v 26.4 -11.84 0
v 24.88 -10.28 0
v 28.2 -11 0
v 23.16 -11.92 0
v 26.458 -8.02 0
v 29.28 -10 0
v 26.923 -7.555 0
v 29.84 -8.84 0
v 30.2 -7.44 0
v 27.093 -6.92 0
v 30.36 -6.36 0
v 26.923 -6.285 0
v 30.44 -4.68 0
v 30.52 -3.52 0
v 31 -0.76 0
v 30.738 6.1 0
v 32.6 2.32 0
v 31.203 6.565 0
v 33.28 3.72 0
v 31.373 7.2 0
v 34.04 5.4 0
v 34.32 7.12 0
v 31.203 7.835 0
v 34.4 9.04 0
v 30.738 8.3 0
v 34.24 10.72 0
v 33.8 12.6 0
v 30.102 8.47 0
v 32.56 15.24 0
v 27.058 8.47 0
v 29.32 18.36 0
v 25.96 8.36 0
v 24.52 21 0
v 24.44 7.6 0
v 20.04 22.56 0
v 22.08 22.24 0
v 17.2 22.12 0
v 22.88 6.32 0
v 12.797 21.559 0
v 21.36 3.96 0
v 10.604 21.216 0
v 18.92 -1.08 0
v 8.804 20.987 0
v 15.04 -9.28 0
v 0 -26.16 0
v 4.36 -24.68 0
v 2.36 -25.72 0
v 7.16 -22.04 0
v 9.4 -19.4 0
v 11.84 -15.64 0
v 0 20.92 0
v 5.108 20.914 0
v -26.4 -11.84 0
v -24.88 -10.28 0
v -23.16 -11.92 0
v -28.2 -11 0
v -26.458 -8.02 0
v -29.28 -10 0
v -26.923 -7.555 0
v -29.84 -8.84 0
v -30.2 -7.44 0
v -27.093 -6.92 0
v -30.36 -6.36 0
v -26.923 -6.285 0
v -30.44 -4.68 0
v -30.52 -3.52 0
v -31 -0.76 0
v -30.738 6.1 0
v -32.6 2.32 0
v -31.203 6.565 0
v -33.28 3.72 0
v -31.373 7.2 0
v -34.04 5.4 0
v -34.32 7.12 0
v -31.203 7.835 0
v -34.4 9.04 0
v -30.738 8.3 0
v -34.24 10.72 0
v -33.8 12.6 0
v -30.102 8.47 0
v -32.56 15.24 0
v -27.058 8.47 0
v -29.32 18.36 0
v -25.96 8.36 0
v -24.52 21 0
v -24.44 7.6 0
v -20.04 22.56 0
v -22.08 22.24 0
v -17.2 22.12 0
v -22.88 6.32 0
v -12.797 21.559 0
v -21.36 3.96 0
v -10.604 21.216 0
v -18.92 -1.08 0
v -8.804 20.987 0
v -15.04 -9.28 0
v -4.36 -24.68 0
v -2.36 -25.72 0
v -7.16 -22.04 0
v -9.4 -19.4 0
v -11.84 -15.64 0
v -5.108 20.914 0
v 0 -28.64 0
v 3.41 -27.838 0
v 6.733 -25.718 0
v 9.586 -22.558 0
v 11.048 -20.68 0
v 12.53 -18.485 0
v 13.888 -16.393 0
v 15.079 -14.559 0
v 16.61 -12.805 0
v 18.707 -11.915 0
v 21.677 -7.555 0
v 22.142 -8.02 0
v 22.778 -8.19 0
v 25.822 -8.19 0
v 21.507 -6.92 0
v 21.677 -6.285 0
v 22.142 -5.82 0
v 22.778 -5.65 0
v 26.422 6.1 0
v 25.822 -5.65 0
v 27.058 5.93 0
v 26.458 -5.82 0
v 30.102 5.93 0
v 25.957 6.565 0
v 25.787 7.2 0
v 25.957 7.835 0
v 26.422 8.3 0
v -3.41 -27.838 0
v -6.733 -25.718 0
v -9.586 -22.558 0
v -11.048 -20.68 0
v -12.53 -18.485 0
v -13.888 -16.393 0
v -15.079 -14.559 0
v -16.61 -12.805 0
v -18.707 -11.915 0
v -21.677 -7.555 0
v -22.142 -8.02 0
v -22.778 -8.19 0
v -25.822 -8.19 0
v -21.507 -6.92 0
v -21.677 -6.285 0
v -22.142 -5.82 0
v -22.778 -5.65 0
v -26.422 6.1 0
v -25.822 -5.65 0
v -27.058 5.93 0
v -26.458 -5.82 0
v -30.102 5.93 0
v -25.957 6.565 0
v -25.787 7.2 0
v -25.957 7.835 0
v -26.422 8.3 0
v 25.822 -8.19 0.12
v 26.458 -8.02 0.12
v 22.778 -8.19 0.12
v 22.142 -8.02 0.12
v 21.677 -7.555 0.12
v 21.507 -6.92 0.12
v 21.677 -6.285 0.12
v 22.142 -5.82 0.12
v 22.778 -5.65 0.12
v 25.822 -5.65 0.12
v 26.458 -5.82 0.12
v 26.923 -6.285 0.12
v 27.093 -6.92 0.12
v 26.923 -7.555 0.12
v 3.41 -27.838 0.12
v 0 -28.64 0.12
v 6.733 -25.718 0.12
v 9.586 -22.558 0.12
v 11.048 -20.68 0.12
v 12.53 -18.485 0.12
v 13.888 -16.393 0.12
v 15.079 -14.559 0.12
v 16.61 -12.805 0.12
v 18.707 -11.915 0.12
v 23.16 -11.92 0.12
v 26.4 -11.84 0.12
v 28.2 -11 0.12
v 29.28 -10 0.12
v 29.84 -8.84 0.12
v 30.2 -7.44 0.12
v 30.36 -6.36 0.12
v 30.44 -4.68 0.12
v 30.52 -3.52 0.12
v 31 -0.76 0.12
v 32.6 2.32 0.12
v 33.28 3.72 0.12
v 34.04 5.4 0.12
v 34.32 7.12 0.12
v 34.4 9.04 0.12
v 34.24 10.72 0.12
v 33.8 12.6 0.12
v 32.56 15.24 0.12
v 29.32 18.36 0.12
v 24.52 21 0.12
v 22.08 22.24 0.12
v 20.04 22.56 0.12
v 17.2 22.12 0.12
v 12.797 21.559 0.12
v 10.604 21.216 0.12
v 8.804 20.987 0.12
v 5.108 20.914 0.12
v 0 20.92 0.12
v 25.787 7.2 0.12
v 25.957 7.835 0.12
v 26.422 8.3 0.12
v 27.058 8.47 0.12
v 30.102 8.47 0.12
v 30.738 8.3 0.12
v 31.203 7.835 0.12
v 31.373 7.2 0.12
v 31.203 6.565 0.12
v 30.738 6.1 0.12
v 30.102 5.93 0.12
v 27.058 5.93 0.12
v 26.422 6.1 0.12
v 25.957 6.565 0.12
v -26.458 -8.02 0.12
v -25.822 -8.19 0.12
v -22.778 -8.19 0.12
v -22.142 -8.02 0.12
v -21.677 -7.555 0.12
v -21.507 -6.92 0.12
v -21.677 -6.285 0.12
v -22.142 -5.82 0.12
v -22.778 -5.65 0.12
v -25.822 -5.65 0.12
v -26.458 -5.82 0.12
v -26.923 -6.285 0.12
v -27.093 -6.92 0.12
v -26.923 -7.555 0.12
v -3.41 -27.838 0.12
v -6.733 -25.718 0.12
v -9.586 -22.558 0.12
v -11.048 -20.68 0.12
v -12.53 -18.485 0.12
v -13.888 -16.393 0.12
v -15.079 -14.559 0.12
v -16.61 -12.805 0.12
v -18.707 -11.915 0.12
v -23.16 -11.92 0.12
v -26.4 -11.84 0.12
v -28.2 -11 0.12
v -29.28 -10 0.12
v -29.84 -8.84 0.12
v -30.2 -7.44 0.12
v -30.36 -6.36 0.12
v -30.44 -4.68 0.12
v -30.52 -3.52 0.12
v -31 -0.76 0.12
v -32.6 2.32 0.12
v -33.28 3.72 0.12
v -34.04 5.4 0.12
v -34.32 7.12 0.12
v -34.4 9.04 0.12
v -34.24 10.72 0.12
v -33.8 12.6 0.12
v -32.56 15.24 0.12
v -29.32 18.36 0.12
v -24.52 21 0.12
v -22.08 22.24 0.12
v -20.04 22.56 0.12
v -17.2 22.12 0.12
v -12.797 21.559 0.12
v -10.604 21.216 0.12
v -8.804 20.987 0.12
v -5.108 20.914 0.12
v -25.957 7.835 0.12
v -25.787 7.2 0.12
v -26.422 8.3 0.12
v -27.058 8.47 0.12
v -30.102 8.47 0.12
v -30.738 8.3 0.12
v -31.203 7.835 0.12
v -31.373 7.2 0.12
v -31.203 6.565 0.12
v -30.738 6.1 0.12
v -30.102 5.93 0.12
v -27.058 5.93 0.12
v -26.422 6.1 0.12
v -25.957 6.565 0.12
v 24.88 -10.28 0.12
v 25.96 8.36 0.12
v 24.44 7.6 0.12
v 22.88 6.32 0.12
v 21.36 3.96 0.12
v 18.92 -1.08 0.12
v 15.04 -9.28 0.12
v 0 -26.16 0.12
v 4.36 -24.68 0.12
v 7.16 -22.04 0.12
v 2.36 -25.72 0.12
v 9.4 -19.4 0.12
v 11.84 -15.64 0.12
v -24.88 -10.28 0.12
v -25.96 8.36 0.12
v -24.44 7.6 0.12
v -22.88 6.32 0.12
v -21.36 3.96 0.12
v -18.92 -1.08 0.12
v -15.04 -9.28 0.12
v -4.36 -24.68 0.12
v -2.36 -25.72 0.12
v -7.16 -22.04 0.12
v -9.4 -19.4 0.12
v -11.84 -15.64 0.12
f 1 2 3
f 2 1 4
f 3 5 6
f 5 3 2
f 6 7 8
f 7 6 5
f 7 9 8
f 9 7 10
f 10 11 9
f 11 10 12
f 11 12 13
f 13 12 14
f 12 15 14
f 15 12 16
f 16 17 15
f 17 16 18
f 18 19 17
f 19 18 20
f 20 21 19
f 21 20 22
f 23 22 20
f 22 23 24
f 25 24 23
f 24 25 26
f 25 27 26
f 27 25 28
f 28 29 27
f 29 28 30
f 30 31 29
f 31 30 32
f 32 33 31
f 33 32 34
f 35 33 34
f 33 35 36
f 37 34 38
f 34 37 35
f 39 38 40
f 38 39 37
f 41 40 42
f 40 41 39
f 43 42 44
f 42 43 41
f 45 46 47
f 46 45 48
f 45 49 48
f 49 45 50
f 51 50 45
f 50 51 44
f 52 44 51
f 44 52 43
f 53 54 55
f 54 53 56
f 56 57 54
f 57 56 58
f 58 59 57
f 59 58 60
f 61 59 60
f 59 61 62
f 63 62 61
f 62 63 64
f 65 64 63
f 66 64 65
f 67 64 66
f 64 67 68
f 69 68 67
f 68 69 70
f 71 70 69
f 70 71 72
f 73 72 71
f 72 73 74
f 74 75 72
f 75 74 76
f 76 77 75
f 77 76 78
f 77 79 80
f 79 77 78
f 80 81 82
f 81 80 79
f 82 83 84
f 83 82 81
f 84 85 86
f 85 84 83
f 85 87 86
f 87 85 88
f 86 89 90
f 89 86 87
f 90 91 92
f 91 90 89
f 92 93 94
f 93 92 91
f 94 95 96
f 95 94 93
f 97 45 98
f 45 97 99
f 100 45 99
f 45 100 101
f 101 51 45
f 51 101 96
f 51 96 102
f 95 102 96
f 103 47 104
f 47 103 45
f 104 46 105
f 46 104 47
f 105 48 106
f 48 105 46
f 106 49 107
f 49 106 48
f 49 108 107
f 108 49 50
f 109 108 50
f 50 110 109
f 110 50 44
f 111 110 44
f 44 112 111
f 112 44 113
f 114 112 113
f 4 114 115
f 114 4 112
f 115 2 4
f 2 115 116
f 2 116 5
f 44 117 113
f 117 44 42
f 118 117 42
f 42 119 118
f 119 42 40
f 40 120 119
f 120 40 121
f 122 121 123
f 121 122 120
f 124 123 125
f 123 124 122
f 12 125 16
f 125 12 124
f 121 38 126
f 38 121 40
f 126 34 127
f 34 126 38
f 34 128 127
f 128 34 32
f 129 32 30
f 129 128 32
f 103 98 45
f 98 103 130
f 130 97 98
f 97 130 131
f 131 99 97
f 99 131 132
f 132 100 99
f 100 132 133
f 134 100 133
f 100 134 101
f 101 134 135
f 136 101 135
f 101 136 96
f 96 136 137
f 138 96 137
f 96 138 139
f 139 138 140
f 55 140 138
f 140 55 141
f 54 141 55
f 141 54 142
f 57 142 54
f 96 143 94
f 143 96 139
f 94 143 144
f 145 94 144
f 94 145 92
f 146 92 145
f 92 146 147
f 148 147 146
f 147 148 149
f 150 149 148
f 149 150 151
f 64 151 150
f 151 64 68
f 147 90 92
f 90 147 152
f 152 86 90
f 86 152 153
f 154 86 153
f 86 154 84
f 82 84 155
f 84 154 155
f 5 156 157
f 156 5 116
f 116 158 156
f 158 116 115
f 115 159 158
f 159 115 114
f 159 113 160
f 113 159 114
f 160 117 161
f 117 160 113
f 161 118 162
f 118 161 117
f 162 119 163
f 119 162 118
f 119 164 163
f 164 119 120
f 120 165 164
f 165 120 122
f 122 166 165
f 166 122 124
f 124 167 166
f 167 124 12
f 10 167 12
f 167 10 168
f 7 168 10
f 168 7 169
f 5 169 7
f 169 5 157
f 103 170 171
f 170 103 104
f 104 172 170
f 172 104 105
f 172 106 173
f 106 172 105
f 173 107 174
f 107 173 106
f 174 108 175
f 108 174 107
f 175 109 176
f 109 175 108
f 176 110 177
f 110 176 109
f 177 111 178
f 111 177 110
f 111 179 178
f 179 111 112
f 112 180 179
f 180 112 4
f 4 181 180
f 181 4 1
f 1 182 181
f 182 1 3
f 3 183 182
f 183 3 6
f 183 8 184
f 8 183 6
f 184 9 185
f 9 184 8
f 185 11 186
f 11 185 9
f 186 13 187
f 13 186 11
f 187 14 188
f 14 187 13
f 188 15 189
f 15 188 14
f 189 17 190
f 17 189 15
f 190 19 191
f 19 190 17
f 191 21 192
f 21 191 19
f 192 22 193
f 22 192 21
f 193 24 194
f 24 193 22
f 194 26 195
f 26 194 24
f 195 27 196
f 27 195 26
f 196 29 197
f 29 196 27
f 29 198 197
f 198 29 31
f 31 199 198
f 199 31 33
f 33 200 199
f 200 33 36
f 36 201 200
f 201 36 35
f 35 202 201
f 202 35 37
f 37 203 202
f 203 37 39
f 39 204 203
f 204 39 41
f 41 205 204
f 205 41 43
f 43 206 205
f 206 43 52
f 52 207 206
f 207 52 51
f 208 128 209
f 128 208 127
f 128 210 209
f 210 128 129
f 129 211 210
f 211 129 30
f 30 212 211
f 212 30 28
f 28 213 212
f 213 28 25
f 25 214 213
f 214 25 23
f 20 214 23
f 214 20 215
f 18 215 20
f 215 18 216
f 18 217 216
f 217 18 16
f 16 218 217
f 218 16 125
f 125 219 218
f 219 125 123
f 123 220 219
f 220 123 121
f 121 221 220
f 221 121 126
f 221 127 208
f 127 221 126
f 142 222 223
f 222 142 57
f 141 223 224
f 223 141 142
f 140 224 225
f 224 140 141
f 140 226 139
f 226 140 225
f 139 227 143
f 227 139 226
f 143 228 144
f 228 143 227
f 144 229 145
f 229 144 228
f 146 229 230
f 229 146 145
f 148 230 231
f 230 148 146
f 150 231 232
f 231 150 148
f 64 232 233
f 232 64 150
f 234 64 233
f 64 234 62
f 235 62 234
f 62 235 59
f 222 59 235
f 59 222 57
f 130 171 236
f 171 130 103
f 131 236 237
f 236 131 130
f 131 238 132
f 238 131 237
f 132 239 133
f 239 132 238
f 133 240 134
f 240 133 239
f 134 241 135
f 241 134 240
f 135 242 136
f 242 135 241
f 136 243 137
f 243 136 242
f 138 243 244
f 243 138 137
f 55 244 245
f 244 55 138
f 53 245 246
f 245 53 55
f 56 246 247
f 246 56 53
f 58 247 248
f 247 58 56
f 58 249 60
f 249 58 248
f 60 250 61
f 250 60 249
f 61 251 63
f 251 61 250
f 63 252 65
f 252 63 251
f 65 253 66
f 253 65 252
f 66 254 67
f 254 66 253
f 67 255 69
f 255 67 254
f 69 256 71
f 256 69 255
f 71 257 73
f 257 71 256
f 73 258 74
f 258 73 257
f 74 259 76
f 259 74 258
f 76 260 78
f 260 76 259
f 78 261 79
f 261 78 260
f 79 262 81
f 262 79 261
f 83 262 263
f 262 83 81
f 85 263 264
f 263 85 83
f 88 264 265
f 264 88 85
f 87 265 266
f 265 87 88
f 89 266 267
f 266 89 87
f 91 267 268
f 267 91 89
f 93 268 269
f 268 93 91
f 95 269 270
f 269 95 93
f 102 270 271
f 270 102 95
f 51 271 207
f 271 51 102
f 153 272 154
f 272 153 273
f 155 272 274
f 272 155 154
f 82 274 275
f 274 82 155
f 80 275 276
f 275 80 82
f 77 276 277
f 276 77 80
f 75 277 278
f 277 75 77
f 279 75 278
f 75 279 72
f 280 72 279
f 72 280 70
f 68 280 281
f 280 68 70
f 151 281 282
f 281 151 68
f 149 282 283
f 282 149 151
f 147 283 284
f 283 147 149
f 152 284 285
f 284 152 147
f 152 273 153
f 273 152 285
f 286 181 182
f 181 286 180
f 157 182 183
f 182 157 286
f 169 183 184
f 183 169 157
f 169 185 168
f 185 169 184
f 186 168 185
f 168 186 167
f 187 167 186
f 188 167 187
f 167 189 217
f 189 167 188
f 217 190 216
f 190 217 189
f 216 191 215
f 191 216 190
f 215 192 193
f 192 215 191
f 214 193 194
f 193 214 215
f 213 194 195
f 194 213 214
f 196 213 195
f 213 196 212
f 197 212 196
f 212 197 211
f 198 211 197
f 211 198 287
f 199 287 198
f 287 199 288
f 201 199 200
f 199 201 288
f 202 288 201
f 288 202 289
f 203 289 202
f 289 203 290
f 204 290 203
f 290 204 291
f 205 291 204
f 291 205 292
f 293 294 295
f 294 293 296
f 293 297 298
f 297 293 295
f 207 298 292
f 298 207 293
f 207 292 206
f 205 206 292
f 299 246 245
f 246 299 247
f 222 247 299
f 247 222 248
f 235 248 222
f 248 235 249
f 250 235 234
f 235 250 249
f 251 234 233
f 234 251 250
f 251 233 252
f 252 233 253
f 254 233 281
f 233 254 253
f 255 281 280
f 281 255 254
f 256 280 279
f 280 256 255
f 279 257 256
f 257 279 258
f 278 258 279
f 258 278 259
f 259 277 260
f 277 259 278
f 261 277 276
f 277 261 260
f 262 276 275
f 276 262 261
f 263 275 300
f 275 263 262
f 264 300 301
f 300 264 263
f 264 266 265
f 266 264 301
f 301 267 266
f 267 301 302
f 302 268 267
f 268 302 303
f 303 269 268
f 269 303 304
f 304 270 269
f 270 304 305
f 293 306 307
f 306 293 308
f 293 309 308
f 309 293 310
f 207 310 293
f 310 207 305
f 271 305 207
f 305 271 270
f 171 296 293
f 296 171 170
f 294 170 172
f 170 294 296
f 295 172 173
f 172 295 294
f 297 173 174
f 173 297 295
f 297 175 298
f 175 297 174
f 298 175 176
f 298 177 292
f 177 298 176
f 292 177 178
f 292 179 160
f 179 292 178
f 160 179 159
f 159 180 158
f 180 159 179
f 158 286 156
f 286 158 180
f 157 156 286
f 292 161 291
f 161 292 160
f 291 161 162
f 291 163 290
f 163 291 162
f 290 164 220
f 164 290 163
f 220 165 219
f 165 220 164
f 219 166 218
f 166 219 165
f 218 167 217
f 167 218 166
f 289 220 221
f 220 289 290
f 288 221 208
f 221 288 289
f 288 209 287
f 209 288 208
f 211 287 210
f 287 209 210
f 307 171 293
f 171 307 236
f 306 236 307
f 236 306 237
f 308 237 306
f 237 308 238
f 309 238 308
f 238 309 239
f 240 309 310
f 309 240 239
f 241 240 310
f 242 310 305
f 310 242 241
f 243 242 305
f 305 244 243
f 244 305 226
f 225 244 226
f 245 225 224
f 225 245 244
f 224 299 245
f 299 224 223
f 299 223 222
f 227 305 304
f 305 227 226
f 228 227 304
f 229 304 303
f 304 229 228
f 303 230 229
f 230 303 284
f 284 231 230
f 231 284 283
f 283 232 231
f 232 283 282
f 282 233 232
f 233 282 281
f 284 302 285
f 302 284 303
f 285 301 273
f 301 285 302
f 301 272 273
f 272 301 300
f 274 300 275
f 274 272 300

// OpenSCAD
// file: s/67144s02.scad
use <../../lib.scad>
function ldraw_lib__s__67144s02() = [
// 0 ~Sheet Plastic  8.5 x  7 Motorcycle Windscreen Border
// 0 Name: s\67144s02.dat
// 0 Author: Philippe Hurbain [Philo]
// 0 !LDRAW_ORG Subpart UPDATE 2023-05
// 0 !LICENSE Licensed under CC BY 4.0 : see CAreadme.txt
// 
// 0 BFC CERTIFY CCW
  [0,"BFC","CERTIFY"],
  [0,"BFC","CCW"],
// 
// 0 !HISTORY 2023-10-31 [OrionP] Official Update 2023-05
// 
// 
// 4 16 0 0 -65.4 0 0 -71.6 8.52439 0 -69.59618 5.9 0 -64.3
  [4,16,0,0,-65.4,0,0,-71.6,8.52439,0,-69.59618,5.9,0,-64.3],
// 4 16 10.9 0 -61.7 5.9 0 -64.3 8.52439 0 -69.59618 16.83324 0 -64.29516
  [4,16,10.9,0,-61.7,5.9,0,-64.3,8.52439,0,-69.59618,16.83324,0,-64.29516],
// 4 16 17.9 0 -55.1 10.9 0 -61.7 16.83324 0 -64.29516 23.96543 0 -56.39425
  [4,16,17.9,0,-55.1,10.9,0,-61.7,16.83324,0,-64.29516,23.96543,0,-56.39425],
// 4 16 23.5 0 -48.5 17.9 0 -55.1 23.96543 0 -56.39425 27.62011 0 -51.6993
  [4,16,23.5,0,-48.5,17.9,0,-55.1,23.96543,0,-56.39425,27.62011,0,-51.6993],
// 4 16 23.5 0 -48.5 27.62011 0 -51.6993 31.32512 0 -46.21306 29.6 0 -39.1
  [4,16,23.5,0,-48.5,27.62011,0,-51.6993,31.32512,0,-46.21306,29.6,0,-39.1],
// 3 16 29.6 0 -39.1 31.32512 0 -46.21306 34.71881 0 -40.98355
  [3,16,29.6,0,-39.1,31.32512,0,-46.21306,34.71881,0,-40.98355],
// 4 16 29.6 0 -39.1 34.71881 0 -40.98355 37.698 0 -36.39858 37.6 0 -23.2
  [4,16,29.6,0,-39.1,34.71881,0,-40.98355,37.698,0,-36.39858,37.6,0,-23.2],
// 3 16 37.6 0 -23.2 37.698 0 -36.39858 41.52391 0 -32.01343
  [3,16,37.6,0,-23.2,37.698,0,-36.39858,41.52391,0,-32.01343],
// 4 16 37.6 0 -23.2 41.52391 0 -32.01343 46.76639 0 -29.78813 54.19371 0 -18.88783
  [4,16,37.6,0,-23.2,41.52391,0,-32.01343,46.76639,0,-29.78813,54.19371,0,-18.88783],
// 3 16 54.19371 0 -18.88783 46.76639 0 -29.78813 55.35609 0 -20.05021
  [3,16,54.19371,0,-18.88783,46.76639,0,-29.78813,55.35609,0,-20.05021],
// 4 16 56.94392 0 -20.47566 55.35609 0 -20.05021 46.76639 0 -29.78813 57.9 0 -29.8
  [4,16,56.94392,0,-20.47566,55.35609,0,-20.05021,46.76639,0,-29.78813,57.9,0,-29.8],
// 4 16 56.94392 0 -20.47566 57.9 0 -29.8 62.2 0 -25.7 64.55608 0 -20.47566
  [4,16,56.94392,0,-20.47566,57.9,0,-29.8,62.2,0,-25.7,64.55608,0,-20.47566],
// 3 16 66.14391 0 -20.05021 64.55608 0 -20.47566 62.2 0 -25.7
  [3,16,66.14391,0,-20.05021,64.55608,0,-20.47566,62.2,0,-25.7],
// 4 16 37.6 0 -23.2 54.19371 0 -18.88783 53.76825 0 -17.3 47.3 0 -2.7
  [4,16,37.6,0,-23.2,54.19371,0,-18.88783,53.76825,0,-17.3,47.3,0,-2.7],
// 3 16 47.3 0 -2.7 53.76825 0 -17.3 54.19371 0 -15.71217
  [3,16,47.3,0,-2.7,53.76825,0,-17.3,54.19371,0,-15.71217],
// 4 16 47.3 0 -2.7 54.19371 0 -15.71217 55.35609 0 -14.54979 53.4 0 9.9
  [4,16,47.3,0,-2.7,54.19371,0,-15.71217,55.35609,0,-14.54979,53.4,0,9.9],
// 4 16 53.4 0 9.9 55.35609 0 -14.54979 56.94392 0 -14.12434 66.05609 0 15.24979
  [4,16,53.4,0,9.9,55.35609,0,-14.54979,56.94392,0,-14.12434,66.05609,0,15.24979],
// 4 16 67.64392 0 14.82434 66.05609 0 15.24979 56.94392 0 -14.12434 64.55608 0 -14.12434
  [4,16,67.64392,0,14.82434,66.05609,0,15.24979,56.94392,0,-14.12434,64.55608,0,-14.12434],
// 4 16 75.25608 0 14.82434 67.64392 0 14.82434 64.55608 0 -14.12434 66.144 0 -14.55
  [4,16,75.25608,0,14.82434,67.64392,0,14.82434,64.55608,0,-14.12434,66.144,0,-14.55],
// 4 16 75.25608 0 14.82434 66.144 0 -14.55 67.30629 0 -15.71217 76.84391 0 15.24979
  [4,16,75.25608,0,14.82434,66.144,0,-14.55,67.30629,0,-15.71217,76.84391,0,15.24979],
// 4 16 53.4 0 9.9 66.05609 0 15.24979 64.89371 0 16.41217 57.2 0 15.8
  [4,16,53.4,0,9.9,66.05609,0,15.24979,64.89371,0,16.41217,57.2,0,15.8],
// 4 16 57.2 0 15.8 64.89371 0 16.41217 64.46825 0 18 61.1 0 19
  [4,16,57.2,0,15.8,64.89371,0,16.41217,64.46825,0,18,61.1,0,19],
// 4 16 61.1 0 19 64.46825 0 18 64.89371 0 19.58783 64.9 0 20.9
  [4,16,61.1,0,19,64.46825,0,18,64.89371,0,19.58783,64.9,0,20.9],
// 3 16 67.64392 0 21.17566 64.9 0 20.9 66.05609 0 20.75021
  [3,16,67.64392,0,21.17566,64.9,0,20.9,66.05609,0,20.75021],
// 3 16 64.9 0 20.9 64.89371 0 19.58783 66.05609 0 20.75021
  [3,16,64.9,0,20.9,64.89371,0,19.58783,66.05609,0,20.75021],
];
module ldraw_lib__s__67144s02(step=0, col=false, unit=2/5, alt=false, line=0.2, solid=!$preview)
    makepoly(ldraw_lib__s__67144s02(), step=step, col=col, unit=unit, alt=alt, line=line, solid=solid);
ldraw_lib__s__67144s02(line=0.2);
// file: s/67144s01.scad
use <../../lib.scad>
function ldraw_lib__s__67144s01() = [
// 0 ~Sheet Plastic  8.5 x  7 Motorcycle Windscreen Surface
// 0 Name: s\67144s01.dat
// 0 Author: Philippe Hurbain [Philo]
// 0 !LDRAW_ORG Subpart UPDATE 2023-05
// 0 !LICENSE Licensed under CC BY 4.0 : see CAreadme.txt
// 
// 0 BFC CERTIFY CCW
  [0,"BFC","CERTIFY"],
  [0,"BFC","CCW"],
// 
// 0 !HISTORY 2023-10-31 [OrionP] Official Update 2023-05
// 
// 
// 4 16 62.2 0 -25.7 57.9 0 -29.8 66 0 -29.6 70.5 0 -27.5
  [4,16,62.2,0,-25.7,57.9,0,-29.8,66,0,-29.6,70.5,0,-27.5],
// 4 16 66.14391 0 -20.05021 62.2 0 -25.7 70.5 0 -27.5 73.2 0 -25
  [4,16,66.14391,0,-20.05021,62.2,0,-25.7,70.5,0,-27.5,73.2,0,-25],
// 4 16 67.30629 0 -18.88783 66.14391 0 -20.05021 73.2 0 -25 74.6 0 -22.1
  [4,16,67.30629,0,-18.88783,66.14391,0,-20.05021,73.2,0,-25,74.6,0,-22.1],
// 4 16 67.30629 0 -18.88783 74.6 0 -22.1 75.5 0 -18.6 67.73175 0 -17.3
  [4,16,67.30629,0,-18.88783,74.6,0,-22.1,75.5,0,-18.6,67.73175,0,-17.3],
// 4 16 67.73175 0 -17.3 75.5 0 -18.6 75.9 0 -15.9 67.30629 0 -15.71217
  [4,16,67.73175,0,-17.3,75.5,0,-18.6,75.9,0,-15.9,67.30629,0,-15.71217],
// 3 16 76.1 0 -11.7 67.30629 0 -15.71217 75.9 0 -15.9
  [3,16,76.1,0,-11.7,67.30629,0,-15.71217,75.9,0,-15.9],
// 3 16 76.3 0 -8.8 67.30629 0 -15.71217 76.1 0 -11.7
  [3,16,76.3,0,-8.8,67.30629,0,-15.71217,76.1,0,-11.7],
// 4 16 67.30629 0 -15.71217 76.3 0 -8.8 77.5 0 -1.9 76.84391 0 15.24979
  [4,16,67.30629,0,-15.71217,76.3,0,-8.8,77.5,0,-1.9,76.84391,0,15.24979],
// 4 16 76.84391 0 15.24979 77.5 0 -1.9 81.5 0 5.8 78.00629 0 16.41217
  [4,16,76.84391,0,15.24979,77.5,0,-1.9,81.5,0,5.8,78.00629,0,16.41217],
// 4 16 78.00629 0 16.41217 81.5 0 5.8 83.2 0 9.3 78.43175 0 18
  [4,16,78.00629,0,16.41217,81.5,0,5.8,83.2,0,9.3,78.43175,0,18],
// 4 16 78.43175 0 18 83.2 0 9.3 85.1 0 13.5 85.8 0 17.8
  [4,16,78.43175,0,18,83.2,0,9.3,85.1,0,13.5,85.8,0,17.8],
// 4 16 78.43175 0 18 85.8 0 17.8 86 0 22.6 78.00629 0 19.58783
  [4,16,78.43175,0,18,85.8,0,17.8,86,0,22.6,78.00629,0,19.58783],
// 4 16 78.00629 0 19.58783 86 0 22.6 85.6 0 26.8 76.844 0 20.75
  [4,16,78.00629,0,19.58783,86,0,22.6,85.6,0,26.8,76.844,0,20.75],
// 4 16 76.844 0 20.75 85.6 0 26.8 84.5 0 31.5 75.25608 0 21.17566
  [4,16,76.844,0,20.75,85.6,0,26.8,84.5,0,31.5,75.25608,0,21.17566],
// 4 16 75.25608 0 21.17566 84.5 0 31.5 81.4 0 38.1 67.64392 0 21.17566
  [4,16,75.25608,0,21.17566,84.5,0,31.5,81.4,0,38.1,67.64392,0,21.17566],
// 4 16 67.64392 0 21.17566 81.4 0 38.1 73.3 0 45.9 64.9 0 20.9
  [4,16,67.64392,0,21.17566,81.4,0,38.1,73.3,0,45.9,64.9,0,20.9],
// 4 16 64.9 0 20.9 73.3 0 45.9 61.3 0 52.5 61.1 0 19
  [4,16,64.9,0,20.9,73.3,0,45.9,61.3,0,52.5,61.1,0,19],
// 4 16 61.1 0 19 61.3 0 52.5 55.2 0 55.6 50.1 0 56.4
  [4,16,61.1,0,19,61.3,0,52.5,55.2,0,55.6,50.1,0,56.4],
// 4 16 57.2 0 15.8 61.1 0 19 50.1 0 56.4 43 0 55.3
  [4,16,57.2,0,15.8,61.1,0,19,50.1,0,56.4,43,0,55.3],
// 4 16 53.4 0 9.9 57.2 0 15.8 43 0 55.3 31.99348 0 53.89863
  [4,16,53.4,0,9.9,57.2,0,15.8,43,0,55.3,31.99348,0,53.89863],
// 4 16 47.3 0 -2.7 53.4 0 9.9 31.99348 0 53.89863 26.50984 0 53.03947
  [4,16,47.3,0,-2.7,53.4,0,9.9,31.99348,0,53.89863,26.50984,0,53.03947],
// 4 16 37.6 0 -23.2 47.3 0 -2.7 26.50984 0 53.03947 22.01075 0 52.46784
  [4,16,37.6,0,-23.2,47.3,0,-2.7,26.50984,0,53.03947,22.01075,0,52.46784],
// 4 16 0 0 -65.4 5.9 0 -64.3 10.9 0 -61.7 17.9 0 -55.1
  [4,16,0,0,-65.4,5.9,0,-64.3,10.9,0,-61.7,17.9,0,-55.1],
// 4 16 0 0 -65.4 17.9 0 -55.1 23.5 0 -48.5 29.6 0 -39.1
  [4,16,0,0,-65.4,17.9,0,-55.1,23.5,0,-48.5,29.6,0,-39.1],
// 4 16 0 0 -65.4 29.6 0 -39.1 37.6 0 -23.2 0 0 52.3
  [4,16,0,0,-65.4,29.6,0,-39.1,37.6,0,-23.2,0,0,52.3],
// 3 16 0 0 52.3 37.6 0 -23.2 12.77089 0 52.2856
  [3,16,0,0,52.3,37.6,0,-23.2,12.77089,0,52.2856],
// 3 16 22.01075 0 52.46784 12.77089 0 52.2856 37.6 0 -23.2
  [3,16,22.01075,0,52.46784,12.77089,0,52.2856,37.6,0,-23.2],
];
module ldraw_lib__s__67144s01(step=0, col=false, unit=2/5, alt=false, line=0.2, solid=!$preview)
    makepoly(ldraw_lib__s__67144s01(), step=step, col=col, unit=unit, alt=alt, line=line, solid=solid);
ldraw_lib__s__67144s01(line=0.2);
// main file
use <../lib.scad>
use <s/67144s01.scad>
use <s/67144s02.scad>
use <s/67144s03.scad>
function ldraw_lib__67144p01() = [
// 0 Sheet Plastic  8.5 x  7 Motorcycle Windscreen with Red Border Pattern
// 0 Name: 67144p01.dat
// 0 Author: Philippe Hurbain [Philo]
// 0 !LDRAW_ORG Part UPDATE 2024-08
// 0 !LICENSE Licensed under CC BY 4.0 : see CAreadme.txt
// 
// 0 BFC CERTIFY CCW
  [0,"BFC","CERTIFY"],
  [0,"BFC","CCW"],
// 
// 0 !CATEGORY Sheet Plastic
// 0 !KEYWORDS bike, Ducati Panigale, Set 42107
// 
// 0 !HISTORY 2024-09-30 [OrionP] Official Update 2024-08
// 
// 1 16 0 0 0 1 0 0 0 -1 0 0 0 1 s\67144s01.dat
  [1,16,0,0,0,1,0,0,0,-1,0,0,0,1, ldraw_lib__s__67144s01()],
// 1 16 0 0 0 -1 0 0 0 -1 0 0 0 1 s\67144s01.dat
  [1,16,0,0,0,-1,0,0,0,-1,0,0,0,1, ldraw_lib__s__67144s01()],
// 1 16 0 0 0 1 0 0 0 -1 0 0 0 1 s\67144s02.dat
  [1,16,0,0,0,1,0,0,0,-1,0,0,0,1, ldraw_lib__s__67144s02()],
// 1 16 0 0 0 -1 0 0 0 -1 0 0 0 1 s\67144s02.dat
  [1,16,0,0,0,-1,0,0,0,-1,0,0,0,1, ldraw_lib__s__67144s02()],
// 1 16 0 0 0 1 0 0 0 1 0 0 0 1 s\67144s03.dat
  [1,16,0,0,0,1,0,0,0,1,0,0,0,1, ldraw_lib__s__67144s03()],
// 1 16 0 0 0 -1 0 0 0 1 0 0 0 1 s\67144s03.dat
  [1,16,0,0,0,-1,0,0,0,1,0,0,0,1, ldraw_lib__s__67144s03()],
// 1 16 0 -.3 0 1 0 0 0 1 0 0 0 1 s\67144s01.dat
  [1,16,0,-.3,0,1,0,0,0,1,0,0,0,1, ldraw_lib__s__67144s01()],
// 1 16 0 -.3 0 -1 0 0 0 1 0 0 0 1 s\67144s01.dat
  [1,16,0,-.3,0,-1,0,0,0,1,0,0,0,1, ldraw_lib__s__67144s01()],
// 0 BFC NOCLIP
  [0,"BFC","NOCLIP"],
// 1 4 0 -.3 0 1 0 0 0 1 0 0 0 1 s\67144s02.dat
  [1,4,0,-.3,0,1,0,0,0,1,0,0,0,1, ldraw_lib__s__67144s02()],
// 1 4 0 -.3 0 -1 0 0 0 1 0 0 0 1 s\67144s02.dat
  [1,4,0,-.3,0,-1,0,0,0,1,0,0,0,1, ldraw_lib__s__67144s02()],
];
module ldraw_lib__67144p01(step=0, col=false, unit=2/5, alt=false, line=0.2, solid=!$preview)
    makepoly(ldraw_lib__67144p01(), step=step, col=col, unit=unit, alt=alt, line=line, solid=solid);
ldraw_lib__67144p01(line=0.2);
